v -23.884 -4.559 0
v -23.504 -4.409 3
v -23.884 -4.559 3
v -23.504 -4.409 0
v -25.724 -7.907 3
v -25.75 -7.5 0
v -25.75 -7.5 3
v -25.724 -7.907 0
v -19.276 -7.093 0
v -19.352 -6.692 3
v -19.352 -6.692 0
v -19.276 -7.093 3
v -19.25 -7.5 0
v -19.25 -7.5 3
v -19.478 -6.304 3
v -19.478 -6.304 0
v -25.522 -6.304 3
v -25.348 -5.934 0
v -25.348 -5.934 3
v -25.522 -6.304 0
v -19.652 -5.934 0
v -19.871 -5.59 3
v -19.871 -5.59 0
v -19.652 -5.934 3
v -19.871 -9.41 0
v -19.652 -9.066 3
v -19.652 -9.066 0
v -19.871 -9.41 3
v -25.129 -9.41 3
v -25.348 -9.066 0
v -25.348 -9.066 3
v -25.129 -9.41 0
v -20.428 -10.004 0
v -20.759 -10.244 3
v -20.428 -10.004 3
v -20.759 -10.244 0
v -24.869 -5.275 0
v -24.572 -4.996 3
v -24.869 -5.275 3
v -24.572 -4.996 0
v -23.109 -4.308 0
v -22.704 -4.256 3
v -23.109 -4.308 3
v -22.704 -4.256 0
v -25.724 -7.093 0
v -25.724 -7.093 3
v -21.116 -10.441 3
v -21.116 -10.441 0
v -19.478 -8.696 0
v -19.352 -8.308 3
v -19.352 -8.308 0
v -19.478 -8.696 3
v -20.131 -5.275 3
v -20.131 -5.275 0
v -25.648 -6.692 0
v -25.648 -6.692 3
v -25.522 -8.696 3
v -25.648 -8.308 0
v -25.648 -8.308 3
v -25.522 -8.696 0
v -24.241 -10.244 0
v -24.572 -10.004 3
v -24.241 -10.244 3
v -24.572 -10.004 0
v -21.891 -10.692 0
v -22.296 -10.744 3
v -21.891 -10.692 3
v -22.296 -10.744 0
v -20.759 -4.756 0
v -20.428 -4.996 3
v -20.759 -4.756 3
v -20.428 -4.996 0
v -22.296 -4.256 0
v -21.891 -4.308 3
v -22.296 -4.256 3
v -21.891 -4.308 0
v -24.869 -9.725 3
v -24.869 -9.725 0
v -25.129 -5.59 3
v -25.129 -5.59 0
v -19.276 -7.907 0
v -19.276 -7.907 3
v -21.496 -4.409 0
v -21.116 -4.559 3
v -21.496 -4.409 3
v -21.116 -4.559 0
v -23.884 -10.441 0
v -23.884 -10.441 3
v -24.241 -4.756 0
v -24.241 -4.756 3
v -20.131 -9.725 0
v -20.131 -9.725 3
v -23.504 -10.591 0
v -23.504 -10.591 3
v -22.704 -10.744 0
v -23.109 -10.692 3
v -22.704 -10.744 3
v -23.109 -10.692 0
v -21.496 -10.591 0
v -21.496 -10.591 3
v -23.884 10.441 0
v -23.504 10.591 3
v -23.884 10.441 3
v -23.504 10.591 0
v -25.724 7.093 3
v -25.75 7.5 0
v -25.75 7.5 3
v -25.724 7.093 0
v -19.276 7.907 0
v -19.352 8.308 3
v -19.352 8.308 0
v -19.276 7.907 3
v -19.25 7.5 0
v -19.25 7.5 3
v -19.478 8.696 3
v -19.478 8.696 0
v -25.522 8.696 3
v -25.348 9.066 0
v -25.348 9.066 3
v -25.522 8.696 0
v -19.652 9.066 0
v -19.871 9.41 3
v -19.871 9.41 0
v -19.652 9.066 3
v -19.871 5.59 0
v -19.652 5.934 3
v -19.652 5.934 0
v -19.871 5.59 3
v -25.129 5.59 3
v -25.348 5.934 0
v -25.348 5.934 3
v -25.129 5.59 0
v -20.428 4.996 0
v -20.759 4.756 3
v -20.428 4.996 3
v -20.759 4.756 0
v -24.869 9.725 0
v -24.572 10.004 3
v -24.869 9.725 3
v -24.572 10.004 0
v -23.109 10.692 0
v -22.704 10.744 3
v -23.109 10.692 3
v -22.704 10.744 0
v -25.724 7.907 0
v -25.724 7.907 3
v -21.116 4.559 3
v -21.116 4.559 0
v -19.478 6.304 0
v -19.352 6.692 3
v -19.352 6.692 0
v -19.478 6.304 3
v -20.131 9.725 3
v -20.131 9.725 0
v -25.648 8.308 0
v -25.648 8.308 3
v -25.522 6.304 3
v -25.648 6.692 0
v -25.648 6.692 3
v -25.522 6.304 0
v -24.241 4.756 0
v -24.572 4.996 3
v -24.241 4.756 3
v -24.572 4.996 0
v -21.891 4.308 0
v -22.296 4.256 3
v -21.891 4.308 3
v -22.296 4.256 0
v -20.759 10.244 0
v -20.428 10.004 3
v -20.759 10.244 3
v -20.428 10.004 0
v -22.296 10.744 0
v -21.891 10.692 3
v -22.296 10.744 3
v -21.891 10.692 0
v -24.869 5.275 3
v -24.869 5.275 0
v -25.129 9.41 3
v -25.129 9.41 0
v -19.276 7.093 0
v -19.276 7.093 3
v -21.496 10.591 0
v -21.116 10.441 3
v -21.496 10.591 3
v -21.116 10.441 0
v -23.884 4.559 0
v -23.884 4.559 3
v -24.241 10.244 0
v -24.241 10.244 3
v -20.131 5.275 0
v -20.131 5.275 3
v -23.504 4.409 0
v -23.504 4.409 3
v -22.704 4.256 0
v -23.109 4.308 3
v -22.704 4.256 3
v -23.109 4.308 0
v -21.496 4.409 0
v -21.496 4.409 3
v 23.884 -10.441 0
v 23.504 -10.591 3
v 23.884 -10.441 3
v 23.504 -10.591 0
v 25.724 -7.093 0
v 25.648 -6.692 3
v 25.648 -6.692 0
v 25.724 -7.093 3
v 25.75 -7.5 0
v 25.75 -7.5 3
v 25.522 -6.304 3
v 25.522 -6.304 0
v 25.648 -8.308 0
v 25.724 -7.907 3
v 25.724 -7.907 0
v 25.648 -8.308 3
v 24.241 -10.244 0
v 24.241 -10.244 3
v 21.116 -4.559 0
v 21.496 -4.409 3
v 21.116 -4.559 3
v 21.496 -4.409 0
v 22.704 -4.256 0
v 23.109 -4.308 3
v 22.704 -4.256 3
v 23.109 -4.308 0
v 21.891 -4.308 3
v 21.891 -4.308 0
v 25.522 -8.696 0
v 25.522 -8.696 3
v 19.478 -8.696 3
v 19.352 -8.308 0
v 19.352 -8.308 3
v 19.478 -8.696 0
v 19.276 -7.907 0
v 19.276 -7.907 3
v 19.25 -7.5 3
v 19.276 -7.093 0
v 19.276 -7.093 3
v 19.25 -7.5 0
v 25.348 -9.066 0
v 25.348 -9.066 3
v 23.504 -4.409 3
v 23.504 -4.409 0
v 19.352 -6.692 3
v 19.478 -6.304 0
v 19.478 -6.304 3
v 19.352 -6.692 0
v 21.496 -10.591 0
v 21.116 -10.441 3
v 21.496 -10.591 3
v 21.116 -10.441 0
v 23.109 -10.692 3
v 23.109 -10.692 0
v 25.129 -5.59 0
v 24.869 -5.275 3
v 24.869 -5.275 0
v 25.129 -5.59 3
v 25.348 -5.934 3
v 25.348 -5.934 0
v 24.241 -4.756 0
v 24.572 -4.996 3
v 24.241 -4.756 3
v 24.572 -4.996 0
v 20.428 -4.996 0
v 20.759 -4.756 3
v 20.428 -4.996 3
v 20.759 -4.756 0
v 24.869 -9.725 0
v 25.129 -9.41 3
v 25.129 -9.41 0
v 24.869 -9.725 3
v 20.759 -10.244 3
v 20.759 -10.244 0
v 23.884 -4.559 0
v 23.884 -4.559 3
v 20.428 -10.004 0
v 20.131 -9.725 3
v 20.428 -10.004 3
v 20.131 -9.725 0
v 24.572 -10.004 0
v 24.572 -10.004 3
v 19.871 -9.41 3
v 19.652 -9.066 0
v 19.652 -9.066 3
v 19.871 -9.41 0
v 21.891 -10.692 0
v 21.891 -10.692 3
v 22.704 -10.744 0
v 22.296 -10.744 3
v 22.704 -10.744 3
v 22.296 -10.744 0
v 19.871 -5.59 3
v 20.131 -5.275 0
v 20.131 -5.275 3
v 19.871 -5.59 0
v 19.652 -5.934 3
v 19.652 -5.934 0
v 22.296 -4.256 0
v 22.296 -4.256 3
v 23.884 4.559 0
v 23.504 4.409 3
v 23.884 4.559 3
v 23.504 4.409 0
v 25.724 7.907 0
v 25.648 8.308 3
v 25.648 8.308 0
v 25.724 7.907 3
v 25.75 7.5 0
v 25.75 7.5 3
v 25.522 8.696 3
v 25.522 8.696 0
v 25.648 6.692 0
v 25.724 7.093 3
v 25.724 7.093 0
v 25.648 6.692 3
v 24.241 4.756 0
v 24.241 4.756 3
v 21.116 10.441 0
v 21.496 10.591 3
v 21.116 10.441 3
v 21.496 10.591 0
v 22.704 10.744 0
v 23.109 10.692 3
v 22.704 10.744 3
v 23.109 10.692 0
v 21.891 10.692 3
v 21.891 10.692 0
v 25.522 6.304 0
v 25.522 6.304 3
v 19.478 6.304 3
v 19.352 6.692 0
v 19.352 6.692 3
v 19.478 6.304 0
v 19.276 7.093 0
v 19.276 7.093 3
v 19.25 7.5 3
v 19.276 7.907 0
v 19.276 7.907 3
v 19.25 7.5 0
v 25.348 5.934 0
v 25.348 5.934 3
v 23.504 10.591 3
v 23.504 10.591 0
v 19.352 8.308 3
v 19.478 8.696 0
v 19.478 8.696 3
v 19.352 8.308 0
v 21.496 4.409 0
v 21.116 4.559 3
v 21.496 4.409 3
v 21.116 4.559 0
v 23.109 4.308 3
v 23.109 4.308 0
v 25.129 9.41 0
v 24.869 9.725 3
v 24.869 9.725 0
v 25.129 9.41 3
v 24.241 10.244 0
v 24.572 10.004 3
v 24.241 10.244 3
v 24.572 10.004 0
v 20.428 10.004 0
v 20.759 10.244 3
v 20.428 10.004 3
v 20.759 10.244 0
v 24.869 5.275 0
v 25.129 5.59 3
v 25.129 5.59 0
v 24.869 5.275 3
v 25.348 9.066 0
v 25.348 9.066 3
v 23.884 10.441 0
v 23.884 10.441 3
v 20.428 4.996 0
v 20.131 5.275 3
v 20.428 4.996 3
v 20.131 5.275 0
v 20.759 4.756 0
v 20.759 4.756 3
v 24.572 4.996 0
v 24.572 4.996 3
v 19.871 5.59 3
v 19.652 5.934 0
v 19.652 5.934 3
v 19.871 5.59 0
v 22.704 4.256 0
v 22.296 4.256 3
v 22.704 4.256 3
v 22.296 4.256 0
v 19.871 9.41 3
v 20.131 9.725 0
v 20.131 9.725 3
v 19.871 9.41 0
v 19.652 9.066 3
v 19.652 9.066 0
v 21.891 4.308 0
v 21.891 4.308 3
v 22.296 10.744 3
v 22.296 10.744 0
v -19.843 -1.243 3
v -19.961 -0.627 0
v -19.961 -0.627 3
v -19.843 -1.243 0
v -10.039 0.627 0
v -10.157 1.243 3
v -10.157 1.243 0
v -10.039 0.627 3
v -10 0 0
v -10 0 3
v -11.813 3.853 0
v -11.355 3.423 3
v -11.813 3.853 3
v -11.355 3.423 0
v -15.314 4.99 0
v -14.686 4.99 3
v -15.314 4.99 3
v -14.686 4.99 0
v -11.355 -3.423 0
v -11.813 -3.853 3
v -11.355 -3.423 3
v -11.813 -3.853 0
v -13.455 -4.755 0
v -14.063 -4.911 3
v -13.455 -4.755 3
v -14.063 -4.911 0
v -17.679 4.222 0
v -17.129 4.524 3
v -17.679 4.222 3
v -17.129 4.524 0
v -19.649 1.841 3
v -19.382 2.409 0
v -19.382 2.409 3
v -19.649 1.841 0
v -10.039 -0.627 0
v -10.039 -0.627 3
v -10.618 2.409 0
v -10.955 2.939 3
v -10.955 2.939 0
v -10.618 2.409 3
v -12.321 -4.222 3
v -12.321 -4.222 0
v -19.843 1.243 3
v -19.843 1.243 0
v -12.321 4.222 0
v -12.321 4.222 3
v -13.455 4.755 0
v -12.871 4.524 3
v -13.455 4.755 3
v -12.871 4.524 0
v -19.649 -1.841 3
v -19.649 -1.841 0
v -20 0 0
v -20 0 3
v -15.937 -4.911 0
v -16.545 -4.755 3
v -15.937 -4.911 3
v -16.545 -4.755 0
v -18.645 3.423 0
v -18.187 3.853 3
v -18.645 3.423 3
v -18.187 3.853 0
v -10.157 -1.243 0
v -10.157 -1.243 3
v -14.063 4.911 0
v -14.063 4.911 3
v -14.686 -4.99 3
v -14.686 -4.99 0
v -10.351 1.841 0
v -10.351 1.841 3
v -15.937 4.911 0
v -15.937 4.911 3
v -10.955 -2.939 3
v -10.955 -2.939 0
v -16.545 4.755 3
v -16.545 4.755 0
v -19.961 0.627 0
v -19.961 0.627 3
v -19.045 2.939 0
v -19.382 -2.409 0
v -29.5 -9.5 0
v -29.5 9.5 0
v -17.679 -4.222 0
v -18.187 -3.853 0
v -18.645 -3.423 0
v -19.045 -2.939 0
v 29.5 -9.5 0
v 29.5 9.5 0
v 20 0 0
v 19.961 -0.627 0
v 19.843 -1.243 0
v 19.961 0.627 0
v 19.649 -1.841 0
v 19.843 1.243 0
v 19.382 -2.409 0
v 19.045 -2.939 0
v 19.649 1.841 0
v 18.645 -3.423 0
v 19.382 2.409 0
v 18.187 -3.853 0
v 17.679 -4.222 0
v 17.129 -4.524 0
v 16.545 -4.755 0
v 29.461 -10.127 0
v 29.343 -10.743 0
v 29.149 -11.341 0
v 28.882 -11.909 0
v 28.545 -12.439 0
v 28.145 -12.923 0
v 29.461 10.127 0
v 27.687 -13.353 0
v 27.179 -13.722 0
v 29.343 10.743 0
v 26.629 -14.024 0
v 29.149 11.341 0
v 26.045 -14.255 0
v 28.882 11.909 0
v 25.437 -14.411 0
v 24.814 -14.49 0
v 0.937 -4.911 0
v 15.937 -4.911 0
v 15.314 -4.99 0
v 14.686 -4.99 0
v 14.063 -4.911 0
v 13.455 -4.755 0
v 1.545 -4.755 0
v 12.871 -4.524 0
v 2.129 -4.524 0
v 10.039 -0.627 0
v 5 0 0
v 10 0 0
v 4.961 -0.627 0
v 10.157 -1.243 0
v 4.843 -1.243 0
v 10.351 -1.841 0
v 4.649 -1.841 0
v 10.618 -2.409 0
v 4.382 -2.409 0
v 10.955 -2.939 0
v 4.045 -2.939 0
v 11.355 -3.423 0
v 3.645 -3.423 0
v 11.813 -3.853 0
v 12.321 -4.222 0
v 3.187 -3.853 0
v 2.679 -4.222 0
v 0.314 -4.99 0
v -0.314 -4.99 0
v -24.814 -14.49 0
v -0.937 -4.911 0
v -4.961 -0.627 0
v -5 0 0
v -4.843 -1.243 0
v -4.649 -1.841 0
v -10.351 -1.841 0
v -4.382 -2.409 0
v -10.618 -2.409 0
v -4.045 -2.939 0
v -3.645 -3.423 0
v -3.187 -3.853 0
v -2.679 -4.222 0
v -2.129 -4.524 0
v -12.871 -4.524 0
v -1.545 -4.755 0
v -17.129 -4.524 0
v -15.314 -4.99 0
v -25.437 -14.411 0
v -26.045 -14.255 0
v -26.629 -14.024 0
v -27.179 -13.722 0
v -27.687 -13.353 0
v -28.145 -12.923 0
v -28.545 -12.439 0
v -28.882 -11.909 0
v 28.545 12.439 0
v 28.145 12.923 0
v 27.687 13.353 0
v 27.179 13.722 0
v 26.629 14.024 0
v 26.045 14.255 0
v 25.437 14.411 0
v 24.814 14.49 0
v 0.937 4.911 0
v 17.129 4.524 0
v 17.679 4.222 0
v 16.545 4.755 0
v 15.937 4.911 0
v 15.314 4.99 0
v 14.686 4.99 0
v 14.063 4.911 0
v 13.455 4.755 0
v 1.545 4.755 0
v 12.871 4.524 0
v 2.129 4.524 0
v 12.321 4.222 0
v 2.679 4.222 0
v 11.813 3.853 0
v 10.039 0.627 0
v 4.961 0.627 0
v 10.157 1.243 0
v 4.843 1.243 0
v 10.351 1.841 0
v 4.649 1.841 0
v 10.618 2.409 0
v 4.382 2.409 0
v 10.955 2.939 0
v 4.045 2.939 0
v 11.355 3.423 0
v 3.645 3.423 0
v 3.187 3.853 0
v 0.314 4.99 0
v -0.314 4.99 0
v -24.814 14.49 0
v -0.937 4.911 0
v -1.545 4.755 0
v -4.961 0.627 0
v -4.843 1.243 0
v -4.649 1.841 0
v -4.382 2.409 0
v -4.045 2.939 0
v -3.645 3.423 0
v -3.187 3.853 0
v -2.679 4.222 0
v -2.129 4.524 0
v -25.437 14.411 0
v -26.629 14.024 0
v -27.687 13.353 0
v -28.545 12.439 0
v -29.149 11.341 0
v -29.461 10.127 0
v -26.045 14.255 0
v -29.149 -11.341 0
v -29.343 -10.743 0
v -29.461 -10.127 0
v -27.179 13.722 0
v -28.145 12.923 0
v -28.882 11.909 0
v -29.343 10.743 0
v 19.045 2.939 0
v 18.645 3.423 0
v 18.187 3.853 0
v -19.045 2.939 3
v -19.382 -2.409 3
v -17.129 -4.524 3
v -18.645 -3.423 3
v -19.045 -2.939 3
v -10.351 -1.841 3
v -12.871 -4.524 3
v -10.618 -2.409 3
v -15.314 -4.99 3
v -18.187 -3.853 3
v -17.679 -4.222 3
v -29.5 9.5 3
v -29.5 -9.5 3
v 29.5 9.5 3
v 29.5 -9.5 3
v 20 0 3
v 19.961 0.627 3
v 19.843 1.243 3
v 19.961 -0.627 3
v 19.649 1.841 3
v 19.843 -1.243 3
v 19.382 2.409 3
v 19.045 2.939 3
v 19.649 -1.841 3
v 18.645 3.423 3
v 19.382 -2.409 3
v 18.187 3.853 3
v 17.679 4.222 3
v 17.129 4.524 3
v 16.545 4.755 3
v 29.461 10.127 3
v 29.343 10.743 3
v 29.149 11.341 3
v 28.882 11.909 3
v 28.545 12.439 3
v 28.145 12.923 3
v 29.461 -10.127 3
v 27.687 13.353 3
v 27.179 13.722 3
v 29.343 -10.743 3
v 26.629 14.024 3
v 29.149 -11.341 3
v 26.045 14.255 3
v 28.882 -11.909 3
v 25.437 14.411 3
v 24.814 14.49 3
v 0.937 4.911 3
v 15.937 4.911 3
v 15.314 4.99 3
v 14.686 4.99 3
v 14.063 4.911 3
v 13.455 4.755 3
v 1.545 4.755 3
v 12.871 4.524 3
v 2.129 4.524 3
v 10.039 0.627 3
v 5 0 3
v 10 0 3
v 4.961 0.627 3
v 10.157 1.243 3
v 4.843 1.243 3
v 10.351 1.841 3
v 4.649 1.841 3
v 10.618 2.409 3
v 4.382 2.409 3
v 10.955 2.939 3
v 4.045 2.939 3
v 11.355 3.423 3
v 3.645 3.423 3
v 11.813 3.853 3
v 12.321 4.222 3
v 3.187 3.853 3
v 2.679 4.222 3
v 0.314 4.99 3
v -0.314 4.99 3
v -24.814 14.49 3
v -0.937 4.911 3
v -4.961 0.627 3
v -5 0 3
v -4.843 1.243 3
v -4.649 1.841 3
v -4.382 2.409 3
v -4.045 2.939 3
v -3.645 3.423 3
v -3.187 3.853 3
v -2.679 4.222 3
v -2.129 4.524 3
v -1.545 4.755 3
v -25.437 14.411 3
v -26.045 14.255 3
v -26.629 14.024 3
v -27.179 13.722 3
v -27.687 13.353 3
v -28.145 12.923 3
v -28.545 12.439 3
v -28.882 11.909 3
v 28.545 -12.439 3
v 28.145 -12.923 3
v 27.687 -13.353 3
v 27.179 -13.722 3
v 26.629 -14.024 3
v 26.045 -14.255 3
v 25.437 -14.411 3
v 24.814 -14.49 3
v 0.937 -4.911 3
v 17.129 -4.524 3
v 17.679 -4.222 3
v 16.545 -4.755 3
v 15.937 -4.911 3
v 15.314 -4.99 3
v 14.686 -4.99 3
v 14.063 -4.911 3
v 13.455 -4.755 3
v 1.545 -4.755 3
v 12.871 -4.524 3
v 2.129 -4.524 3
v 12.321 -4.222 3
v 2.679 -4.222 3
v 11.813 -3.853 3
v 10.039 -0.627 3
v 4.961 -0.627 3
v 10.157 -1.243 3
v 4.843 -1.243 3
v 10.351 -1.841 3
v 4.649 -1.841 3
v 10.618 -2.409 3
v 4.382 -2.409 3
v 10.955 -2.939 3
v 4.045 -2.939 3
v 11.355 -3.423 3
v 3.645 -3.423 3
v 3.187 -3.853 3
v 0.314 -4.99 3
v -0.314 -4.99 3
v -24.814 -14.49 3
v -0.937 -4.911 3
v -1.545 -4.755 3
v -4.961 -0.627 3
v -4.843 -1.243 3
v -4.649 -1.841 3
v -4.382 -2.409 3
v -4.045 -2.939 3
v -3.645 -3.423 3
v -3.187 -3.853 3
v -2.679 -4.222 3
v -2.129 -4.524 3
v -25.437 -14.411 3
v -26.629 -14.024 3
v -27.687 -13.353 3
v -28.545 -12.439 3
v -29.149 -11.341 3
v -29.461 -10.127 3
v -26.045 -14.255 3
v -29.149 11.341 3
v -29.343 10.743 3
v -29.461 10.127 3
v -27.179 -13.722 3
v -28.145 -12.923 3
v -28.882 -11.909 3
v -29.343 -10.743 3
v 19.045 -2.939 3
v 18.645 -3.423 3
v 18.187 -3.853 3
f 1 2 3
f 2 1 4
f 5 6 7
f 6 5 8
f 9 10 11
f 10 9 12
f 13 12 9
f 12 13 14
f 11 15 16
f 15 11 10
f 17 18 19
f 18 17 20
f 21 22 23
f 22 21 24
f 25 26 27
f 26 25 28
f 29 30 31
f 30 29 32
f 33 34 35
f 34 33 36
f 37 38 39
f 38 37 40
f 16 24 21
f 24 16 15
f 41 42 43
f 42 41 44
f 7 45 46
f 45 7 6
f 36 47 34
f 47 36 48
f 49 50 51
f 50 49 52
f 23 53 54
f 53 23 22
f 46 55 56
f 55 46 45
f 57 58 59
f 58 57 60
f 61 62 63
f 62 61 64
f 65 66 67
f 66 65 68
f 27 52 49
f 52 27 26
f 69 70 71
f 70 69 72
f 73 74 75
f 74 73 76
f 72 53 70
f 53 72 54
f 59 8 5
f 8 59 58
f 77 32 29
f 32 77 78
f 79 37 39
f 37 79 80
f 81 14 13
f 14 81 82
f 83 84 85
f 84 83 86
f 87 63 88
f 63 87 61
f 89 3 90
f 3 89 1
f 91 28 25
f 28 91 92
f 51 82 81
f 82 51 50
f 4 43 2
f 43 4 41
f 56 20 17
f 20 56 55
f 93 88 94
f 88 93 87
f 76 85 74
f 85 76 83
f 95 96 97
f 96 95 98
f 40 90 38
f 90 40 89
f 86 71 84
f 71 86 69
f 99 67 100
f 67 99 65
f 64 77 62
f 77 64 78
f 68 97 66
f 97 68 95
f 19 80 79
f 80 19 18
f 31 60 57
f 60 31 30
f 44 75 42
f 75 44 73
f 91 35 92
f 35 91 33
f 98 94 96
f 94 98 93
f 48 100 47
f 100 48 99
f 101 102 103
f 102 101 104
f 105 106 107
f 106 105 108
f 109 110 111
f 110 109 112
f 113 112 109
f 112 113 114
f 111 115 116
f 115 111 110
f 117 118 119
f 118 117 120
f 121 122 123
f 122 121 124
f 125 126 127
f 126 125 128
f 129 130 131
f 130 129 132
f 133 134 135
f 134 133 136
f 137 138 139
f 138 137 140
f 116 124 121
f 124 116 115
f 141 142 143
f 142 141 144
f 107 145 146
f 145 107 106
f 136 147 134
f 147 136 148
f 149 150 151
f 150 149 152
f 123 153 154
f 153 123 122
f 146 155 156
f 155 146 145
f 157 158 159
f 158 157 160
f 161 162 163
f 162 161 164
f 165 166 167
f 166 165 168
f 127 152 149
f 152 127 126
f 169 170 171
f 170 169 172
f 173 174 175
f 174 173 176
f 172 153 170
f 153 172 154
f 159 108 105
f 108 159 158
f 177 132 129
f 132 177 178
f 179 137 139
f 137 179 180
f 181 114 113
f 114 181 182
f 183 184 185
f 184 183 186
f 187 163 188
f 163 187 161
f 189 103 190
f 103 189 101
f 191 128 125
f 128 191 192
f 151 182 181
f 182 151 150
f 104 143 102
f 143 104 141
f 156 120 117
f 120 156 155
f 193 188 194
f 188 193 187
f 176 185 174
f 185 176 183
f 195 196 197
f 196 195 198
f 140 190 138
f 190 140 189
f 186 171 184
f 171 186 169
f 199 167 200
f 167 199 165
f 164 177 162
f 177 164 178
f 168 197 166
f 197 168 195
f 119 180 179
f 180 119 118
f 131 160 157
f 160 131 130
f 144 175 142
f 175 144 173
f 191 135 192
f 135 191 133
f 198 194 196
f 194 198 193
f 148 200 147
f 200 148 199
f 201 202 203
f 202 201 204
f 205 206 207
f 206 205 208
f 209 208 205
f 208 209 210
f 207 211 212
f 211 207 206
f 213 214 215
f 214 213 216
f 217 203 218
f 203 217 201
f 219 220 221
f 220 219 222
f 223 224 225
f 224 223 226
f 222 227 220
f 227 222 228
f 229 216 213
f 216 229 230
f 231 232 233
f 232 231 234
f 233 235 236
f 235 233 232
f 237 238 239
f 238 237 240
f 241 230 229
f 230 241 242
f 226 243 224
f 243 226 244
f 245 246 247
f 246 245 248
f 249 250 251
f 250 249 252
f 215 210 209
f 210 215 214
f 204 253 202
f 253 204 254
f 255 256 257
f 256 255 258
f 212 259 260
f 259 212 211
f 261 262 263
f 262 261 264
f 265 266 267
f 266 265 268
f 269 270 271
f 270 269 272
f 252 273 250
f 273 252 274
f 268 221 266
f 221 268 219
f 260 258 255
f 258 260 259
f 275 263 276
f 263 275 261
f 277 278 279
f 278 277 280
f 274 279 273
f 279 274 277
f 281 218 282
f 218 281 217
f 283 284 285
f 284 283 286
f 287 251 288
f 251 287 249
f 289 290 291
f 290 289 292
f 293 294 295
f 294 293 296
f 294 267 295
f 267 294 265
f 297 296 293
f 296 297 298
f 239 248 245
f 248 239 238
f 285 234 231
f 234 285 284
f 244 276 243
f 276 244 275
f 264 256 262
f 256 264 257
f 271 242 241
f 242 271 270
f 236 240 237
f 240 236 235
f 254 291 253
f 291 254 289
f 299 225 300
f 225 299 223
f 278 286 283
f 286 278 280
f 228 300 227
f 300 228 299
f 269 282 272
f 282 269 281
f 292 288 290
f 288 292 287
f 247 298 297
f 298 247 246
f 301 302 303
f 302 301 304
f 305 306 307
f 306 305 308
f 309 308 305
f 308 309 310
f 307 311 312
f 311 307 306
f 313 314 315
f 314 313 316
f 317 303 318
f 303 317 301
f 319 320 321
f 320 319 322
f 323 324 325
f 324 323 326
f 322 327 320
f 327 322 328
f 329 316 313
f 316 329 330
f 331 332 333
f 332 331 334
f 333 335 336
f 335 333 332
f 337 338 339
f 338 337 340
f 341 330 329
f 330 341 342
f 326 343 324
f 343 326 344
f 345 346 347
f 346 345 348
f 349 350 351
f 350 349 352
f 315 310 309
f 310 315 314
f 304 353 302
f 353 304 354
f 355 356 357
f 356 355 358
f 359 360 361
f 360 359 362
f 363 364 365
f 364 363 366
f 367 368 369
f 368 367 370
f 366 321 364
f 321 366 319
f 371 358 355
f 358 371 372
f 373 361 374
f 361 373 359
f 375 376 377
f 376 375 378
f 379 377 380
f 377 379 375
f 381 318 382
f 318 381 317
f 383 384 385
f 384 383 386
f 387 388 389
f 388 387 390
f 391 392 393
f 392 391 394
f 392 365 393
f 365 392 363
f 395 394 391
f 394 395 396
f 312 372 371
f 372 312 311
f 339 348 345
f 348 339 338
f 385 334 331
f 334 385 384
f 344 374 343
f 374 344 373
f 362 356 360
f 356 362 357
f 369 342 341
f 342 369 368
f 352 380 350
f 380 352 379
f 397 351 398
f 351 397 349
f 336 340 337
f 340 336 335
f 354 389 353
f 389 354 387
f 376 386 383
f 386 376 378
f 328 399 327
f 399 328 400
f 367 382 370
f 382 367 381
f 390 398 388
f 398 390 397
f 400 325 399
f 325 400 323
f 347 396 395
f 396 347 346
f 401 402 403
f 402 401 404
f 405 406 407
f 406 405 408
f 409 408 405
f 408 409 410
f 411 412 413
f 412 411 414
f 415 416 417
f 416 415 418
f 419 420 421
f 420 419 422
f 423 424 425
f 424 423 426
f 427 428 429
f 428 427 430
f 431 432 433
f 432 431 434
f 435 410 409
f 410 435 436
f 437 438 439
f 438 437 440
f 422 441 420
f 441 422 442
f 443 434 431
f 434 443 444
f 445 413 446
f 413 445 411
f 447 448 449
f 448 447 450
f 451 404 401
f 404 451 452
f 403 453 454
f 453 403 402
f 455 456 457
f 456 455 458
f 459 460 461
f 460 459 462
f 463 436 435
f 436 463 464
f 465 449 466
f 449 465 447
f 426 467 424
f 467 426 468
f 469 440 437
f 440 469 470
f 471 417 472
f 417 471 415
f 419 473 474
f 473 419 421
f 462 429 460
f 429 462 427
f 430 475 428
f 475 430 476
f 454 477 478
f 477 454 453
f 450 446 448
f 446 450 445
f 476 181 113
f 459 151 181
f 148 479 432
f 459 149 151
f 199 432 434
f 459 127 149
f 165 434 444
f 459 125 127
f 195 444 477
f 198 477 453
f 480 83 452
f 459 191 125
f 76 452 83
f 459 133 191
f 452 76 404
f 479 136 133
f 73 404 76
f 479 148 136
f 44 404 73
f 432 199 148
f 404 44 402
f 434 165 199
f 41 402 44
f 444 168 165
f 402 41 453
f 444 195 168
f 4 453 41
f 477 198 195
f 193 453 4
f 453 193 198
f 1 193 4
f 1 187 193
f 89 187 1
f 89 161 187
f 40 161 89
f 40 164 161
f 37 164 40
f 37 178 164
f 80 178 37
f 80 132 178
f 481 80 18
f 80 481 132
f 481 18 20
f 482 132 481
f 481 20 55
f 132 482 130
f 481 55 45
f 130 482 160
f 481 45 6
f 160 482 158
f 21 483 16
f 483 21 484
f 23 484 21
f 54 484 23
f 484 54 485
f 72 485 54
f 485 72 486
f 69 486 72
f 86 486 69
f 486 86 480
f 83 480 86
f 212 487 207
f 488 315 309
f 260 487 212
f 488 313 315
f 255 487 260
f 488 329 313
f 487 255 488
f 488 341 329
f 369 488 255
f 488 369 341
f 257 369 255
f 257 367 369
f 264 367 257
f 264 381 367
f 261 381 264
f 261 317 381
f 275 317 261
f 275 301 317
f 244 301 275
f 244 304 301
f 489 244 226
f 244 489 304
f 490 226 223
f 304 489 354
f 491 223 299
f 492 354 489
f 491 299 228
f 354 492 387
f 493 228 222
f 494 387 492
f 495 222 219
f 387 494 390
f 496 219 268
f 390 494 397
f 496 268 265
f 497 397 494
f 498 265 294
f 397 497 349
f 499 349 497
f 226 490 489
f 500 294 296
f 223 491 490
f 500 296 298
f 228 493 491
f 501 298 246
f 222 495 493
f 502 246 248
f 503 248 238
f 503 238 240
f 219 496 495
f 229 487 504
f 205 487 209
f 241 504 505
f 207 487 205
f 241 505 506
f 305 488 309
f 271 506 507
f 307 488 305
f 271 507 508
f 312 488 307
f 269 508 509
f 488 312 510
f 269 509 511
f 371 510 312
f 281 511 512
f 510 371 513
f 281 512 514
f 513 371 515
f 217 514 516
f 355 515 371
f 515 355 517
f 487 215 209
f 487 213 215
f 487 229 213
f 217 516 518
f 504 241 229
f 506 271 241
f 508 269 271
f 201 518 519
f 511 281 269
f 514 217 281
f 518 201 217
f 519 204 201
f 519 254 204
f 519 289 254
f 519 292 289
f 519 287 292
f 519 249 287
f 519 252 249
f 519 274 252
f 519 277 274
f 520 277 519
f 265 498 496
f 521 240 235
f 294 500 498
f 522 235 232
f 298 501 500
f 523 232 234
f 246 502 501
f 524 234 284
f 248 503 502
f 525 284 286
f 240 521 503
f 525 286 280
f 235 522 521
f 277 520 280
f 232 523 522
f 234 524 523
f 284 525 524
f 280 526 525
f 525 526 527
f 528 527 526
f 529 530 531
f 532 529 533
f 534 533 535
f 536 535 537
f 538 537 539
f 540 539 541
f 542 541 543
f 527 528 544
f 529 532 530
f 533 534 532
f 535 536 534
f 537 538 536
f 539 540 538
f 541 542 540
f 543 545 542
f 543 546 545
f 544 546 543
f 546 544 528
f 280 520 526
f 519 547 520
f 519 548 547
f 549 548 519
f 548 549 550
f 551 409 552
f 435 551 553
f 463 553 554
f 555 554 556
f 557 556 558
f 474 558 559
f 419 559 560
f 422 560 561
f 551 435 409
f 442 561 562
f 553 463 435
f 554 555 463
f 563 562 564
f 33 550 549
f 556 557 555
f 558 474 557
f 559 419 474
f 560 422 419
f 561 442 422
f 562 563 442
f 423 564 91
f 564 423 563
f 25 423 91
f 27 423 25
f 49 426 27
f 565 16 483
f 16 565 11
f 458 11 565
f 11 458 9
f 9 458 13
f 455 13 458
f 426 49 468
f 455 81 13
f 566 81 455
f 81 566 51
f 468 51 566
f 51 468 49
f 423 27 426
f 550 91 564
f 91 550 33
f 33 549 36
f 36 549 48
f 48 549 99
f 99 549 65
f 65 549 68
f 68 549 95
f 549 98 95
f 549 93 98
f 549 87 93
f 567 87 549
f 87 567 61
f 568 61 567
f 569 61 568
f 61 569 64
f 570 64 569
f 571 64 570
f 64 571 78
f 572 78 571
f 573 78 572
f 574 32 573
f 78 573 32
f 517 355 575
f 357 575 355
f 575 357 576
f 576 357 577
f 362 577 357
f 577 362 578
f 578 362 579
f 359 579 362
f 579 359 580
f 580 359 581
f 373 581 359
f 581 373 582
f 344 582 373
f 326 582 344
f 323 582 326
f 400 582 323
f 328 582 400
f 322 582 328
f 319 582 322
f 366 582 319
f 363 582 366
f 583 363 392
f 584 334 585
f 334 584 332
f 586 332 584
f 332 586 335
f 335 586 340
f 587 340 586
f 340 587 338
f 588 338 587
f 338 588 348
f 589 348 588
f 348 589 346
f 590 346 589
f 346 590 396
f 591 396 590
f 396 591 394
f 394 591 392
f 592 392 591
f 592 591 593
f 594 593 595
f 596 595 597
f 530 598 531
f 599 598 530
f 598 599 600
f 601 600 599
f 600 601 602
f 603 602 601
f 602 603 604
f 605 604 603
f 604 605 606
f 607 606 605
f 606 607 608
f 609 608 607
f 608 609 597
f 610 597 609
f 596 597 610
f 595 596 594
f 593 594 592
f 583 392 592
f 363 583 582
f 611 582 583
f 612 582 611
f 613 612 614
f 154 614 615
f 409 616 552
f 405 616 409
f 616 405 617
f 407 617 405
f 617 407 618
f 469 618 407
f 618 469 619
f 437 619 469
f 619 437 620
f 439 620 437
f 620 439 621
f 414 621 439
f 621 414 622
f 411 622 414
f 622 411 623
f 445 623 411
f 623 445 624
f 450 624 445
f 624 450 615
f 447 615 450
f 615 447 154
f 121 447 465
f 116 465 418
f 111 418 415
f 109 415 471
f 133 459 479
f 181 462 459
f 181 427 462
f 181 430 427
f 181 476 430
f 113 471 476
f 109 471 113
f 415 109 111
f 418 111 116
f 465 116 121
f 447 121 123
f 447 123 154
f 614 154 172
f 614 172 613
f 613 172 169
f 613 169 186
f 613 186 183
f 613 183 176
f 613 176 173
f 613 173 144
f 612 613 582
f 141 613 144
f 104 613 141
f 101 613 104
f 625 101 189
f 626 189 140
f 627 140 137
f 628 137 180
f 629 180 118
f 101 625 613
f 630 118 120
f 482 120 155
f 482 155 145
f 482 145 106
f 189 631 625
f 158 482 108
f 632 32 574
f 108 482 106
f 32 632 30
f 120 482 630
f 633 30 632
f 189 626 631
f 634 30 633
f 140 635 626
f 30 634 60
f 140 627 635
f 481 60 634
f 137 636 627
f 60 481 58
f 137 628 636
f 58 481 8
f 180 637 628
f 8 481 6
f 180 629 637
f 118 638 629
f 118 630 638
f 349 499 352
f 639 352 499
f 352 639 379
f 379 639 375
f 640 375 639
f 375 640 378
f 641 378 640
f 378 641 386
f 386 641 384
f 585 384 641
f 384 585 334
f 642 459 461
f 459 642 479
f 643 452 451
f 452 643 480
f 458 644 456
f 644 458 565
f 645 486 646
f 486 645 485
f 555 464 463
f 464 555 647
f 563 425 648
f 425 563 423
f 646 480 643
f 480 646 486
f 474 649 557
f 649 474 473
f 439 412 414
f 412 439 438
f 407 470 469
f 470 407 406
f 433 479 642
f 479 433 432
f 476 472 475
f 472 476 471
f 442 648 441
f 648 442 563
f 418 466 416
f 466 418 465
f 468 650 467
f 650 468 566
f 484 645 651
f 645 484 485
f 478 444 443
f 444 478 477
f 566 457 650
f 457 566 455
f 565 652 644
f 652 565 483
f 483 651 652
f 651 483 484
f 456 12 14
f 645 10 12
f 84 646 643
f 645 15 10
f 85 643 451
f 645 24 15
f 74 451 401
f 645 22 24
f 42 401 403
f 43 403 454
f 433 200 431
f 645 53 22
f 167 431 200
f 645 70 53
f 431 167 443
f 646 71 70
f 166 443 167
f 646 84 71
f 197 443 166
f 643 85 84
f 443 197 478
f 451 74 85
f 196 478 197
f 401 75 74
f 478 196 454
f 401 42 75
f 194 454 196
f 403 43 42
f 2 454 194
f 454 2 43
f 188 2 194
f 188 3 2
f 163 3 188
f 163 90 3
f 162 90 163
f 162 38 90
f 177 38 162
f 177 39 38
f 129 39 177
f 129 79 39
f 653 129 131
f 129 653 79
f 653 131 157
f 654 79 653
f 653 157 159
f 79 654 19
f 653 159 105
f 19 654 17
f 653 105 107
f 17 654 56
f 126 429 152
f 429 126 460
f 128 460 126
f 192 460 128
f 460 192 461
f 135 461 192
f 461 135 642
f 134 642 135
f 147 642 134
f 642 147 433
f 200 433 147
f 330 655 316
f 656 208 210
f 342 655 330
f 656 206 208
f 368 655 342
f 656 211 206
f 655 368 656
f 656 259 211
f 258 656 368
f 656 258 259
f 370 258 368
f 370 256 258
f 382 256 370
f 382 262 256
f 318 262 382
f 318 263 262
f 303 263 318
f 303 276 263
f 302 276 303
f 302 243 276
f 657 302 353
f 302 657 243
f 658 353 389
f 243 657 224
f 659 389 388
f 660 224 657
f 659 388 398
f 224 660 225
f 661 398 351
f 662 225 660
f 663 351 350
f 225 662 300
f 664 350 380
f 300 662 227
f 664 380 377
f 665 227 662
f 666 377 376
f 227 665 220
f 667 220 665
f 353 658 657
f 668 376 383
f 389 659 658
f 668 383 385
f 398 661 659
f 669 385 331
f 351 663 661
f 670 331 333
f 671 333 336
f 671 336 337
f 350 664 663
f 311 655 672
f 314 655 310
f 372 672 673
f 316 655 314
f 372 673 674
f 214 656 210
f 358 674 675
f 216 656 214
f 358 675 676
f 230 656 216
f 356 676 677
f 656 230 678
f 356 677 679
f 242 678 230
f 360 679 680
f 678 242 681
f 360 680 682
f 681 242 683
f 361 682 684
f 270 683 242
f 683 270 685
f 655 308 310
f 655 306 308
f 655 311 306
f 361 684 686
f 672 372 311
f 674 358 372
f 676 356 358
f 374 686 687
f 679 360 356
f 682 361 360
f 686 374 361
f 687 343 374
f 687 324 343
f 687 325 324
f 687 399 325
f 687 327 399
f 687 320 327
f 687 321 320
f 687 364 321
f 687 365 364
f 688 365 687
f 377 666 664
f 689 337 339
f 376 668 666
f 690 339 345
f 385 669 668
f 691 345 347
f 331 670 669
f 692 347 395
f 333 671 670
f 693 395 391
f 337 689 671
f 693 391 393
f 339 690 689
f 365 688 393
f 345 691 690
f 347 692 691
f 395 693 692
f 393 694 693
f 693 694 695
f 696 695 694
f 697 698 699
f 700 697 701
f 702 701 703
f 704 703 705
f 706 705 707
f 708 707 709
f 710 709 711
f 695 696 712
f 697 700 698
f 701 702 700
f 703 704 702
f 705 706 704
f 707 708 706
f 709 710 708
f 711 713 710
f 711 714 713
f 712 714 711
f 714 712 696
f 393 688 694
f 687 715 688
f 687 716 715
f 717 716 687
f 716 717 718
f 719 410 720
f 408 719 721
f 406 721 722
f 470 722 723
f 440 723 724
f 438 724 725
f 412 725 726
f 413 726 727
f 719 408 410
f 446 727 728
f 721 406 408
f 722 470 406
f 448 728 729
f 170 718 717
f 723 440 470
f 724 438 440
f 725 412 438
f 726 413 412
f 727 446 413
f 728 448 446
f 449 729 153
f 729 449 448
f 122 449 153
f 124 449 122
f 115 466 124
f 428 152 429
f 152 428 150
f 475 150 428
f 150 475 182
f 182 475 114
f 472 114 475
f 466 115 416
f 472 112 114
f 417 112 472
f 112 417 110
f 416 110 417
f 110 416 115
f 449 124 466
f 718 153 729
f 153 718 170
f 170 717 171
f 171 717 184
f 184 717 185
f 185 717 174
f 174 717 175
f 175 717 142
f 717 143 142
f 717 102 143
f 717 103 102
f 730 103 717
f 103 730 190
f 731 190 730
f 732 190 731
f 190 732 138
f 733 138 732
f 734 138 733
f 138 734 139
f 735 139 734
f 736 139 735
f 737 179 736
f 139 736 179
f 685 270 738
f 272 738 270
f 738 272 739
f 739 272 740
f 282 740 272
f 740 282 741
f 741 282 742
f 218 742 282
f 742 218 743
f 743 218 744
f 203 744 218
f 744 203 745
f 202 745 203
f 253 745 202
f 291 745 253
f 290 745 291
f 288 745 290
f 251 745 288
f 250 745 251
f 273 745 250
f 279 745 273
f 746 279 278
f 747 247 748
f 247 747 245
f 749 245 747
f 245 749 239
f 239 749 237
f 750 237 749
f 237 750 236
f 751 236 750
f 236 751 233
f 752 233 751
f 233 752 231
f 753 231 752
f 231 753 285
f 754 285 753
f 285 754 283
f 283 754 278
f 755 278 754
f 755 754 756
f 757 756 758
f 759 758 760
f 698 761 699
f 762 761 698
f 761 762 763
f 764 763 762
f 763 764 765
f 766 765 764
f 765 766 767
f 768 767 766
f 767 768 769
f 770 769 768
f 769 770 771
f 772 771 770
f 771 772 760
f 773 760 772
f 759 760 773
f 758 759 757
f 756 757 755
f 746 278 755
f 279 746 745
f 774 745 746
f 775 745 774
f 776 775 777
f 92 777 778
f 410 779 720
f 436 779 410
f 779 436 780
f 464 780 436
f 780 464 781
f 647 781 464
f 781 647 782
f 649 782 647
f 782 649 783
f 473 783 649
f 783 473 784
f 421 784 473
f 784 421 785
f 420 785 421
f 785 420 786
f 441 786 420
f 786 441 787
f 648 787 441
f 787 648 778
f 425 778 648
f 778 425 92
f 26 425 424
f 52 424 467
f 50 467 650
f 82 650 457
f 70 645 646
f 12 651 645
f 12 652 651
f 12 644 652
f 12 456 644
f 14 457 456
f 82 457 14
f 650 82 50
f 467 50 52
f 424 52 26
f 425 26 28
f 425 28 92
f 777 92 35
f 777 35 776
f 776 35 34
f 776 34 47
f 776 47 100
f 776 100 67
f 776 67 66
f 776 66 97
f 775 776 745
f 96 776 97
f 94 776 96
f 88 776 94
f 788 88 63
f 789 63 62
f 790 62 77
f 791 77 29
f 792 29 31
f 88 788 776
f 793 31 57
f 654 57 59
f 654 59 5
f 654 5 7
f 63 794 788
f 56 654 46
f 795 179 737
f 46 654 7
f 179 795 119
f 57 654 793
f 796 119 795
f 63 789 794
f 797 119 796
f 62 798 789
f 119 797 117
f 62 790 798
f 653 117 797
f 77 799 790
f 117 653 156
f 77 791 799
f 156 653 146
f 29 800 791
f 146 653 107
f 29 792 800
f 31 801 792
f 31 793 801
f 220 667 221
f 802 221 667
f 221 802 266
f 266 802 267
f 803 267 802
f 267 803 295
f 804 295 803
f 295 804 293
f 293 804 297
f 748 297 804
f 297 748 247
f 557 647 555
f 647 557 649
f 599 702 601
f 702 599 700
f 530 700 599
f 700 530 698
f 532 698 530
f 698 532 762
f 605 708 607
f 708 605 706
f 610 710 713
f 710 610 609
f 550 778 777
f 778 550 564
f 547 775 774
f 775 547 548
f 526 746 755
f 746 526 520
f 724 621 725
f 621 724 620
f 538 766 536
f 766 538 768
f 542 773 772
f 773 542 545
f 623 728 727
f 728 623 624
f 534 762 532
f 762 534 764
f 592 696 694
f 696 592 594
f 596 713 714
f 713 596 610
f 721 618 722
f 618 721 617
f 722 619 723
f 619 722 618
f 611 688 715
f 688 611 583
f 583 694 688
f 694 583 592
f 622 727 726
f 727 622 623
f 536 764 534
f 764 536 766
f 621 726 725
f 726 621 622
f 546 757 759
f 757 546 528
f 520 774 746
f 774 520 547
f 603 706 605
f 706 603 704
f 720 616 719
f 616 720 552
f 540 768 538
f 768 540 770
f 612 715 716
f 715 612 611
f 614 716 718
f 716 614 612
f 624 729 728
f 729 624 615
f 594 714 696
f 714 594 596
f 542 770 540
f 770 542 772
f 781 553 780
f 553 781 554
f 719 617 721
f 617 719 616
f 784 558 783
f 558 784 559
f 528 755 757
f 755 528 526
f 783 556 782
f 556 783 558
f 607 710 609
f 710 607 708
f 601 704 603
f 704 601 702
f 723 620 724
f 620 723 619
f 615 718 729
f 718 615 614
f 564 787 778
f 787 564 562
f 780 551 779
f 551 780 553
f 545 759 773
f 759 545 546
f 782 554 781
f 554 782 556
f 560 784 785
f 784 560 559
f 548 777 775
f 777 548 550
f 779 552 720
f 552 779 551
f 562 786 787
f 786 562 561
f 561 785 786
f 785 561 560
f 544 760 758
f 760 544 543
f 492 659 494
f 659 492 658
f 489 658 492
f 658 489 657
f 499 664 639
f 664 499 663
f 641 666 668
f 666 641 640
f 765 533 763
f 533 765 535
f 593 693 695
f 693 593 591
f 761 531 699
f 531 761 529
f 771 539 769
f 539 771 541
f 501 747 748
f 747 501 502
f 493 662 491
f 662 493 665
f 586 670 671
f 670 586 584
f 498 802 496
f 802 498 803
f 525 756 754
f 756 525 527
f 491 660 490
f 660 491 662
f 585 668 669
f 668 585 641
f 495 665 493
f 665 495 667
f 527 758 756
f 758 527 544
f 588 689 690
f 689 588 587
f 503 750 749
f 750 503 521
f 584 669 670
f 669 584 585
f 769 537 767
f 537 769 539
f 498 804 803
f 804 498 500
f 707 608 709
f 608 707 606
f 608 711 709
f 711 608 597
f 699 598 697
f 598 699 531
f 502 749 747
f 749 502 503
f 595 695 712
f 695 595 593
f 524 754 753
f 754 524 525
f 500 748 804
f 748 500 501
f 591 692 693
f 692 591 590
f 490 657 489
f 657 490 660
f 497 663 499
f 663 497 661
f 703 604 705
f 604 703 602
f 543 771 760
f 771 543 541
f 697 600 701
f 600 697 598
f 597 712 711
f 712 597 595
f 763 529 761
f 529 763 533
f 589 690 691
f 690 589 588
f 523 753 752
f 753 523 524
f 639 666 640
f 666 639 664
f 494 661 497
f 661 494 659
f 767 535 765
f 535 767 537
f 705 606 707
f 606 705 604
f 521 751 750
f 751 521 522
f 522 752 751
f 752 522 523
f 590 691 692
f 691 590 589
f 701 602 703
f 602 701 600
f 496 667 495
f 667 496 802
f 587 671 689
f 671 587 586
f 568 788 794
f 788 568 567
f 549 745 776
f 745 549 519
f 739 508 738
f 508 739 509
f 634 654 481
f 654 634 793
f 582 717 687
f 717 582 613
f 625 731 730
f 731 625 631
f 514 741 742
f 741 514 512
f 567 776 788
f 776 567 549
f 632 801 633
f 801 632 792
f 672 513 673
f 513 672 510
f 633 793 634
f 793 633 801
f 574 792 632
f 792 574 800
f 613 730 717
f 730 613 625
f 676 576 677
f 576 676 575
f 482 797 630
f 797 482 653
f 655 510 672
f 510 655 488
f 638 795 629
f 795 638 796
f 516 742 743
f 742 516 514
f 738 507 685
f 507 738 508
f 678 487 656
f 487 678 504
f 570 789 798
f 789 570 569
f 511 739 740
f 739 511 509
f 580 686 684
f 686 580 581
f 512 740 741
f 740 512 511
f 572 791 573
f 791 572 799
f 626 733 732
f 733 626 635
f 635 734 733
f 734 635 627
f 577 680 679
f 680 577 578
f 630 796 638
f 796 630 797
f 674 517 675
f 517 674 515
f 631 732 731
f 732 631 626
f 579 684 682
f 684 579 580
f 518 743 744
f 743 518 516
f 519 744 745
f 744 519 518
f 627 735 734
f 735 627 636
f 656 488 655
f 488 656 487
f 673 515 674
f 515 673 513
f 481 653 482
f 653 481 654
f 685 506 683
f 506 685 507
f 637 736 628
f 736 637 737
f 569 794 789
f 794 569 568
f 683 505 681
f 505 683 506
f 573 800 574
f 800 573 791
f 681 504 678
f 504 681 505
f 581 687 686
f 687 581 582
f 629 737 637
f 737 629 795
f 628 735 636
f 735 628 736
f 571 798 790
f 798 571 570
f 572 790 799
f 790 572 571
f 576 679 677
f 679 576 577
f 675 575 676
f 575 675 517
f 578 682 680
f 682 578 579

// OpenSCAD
$fn = 50;

difference() {
	union() {
		hull() {
			translate(v = [-24.5, 9.5, 0]) {
				cylinder(h = 3, r = 5);
			}
			translate(v = [24.5, 9.5, 0]) {
				cylinder(h = 3, r = 5);
			}
			translate(v = [-24.5, -9.5, 0]) {
				cylinder(h = 3, r = 5);
			}
			translate(v = [24.5, -9.5, 0]) {
				cylinder(h = 3, r = 5);
			}
		}
	}
	union() {
		translate(v = [-22.5, -7.5, -100.0]) {
			cylinder(h = 200, r = 3.25);
		}
		translate(v = [-22.5, 7.5, -100.0]) {
			cylinder(h = 200, r = 3.25);
		}
		translate(v = [22.5, -7.5, -100.0]) {
			cylinder(h = 200, r = 3.25);
		}
		translate(v = [22.5, 7.5, -100.0]) {
			cylinder(h = 200, r = 3.25);
		}
		translate(v = [-22.5, -7.5, -100.0]) {
			cylinder(h = 200, r = 1.8);
		}
		translate(v = [-22.5, 7.5, -100.0]) {
			cylinder(h = 200, r = 1.8);
		}
		translate(v = [22.5, -7.5, -100.0]) {
			cylinder(h = 200, r = 1.8);
		}
		translate(v = [22.5, 7.5, -100.0]) {
			cylinder(h = 200, r = 1.8);
		}
		translate(v = [-15.0, 0, 0.0]) {
			cylinder(h = 3, r = 5.0);
		}
		cylinder(h = 3, r = 5.0);
		translate(v = [15.0, 0, 0.0]) {
			cylinder(h = 3, r = 5.0);
		}
	}
}
